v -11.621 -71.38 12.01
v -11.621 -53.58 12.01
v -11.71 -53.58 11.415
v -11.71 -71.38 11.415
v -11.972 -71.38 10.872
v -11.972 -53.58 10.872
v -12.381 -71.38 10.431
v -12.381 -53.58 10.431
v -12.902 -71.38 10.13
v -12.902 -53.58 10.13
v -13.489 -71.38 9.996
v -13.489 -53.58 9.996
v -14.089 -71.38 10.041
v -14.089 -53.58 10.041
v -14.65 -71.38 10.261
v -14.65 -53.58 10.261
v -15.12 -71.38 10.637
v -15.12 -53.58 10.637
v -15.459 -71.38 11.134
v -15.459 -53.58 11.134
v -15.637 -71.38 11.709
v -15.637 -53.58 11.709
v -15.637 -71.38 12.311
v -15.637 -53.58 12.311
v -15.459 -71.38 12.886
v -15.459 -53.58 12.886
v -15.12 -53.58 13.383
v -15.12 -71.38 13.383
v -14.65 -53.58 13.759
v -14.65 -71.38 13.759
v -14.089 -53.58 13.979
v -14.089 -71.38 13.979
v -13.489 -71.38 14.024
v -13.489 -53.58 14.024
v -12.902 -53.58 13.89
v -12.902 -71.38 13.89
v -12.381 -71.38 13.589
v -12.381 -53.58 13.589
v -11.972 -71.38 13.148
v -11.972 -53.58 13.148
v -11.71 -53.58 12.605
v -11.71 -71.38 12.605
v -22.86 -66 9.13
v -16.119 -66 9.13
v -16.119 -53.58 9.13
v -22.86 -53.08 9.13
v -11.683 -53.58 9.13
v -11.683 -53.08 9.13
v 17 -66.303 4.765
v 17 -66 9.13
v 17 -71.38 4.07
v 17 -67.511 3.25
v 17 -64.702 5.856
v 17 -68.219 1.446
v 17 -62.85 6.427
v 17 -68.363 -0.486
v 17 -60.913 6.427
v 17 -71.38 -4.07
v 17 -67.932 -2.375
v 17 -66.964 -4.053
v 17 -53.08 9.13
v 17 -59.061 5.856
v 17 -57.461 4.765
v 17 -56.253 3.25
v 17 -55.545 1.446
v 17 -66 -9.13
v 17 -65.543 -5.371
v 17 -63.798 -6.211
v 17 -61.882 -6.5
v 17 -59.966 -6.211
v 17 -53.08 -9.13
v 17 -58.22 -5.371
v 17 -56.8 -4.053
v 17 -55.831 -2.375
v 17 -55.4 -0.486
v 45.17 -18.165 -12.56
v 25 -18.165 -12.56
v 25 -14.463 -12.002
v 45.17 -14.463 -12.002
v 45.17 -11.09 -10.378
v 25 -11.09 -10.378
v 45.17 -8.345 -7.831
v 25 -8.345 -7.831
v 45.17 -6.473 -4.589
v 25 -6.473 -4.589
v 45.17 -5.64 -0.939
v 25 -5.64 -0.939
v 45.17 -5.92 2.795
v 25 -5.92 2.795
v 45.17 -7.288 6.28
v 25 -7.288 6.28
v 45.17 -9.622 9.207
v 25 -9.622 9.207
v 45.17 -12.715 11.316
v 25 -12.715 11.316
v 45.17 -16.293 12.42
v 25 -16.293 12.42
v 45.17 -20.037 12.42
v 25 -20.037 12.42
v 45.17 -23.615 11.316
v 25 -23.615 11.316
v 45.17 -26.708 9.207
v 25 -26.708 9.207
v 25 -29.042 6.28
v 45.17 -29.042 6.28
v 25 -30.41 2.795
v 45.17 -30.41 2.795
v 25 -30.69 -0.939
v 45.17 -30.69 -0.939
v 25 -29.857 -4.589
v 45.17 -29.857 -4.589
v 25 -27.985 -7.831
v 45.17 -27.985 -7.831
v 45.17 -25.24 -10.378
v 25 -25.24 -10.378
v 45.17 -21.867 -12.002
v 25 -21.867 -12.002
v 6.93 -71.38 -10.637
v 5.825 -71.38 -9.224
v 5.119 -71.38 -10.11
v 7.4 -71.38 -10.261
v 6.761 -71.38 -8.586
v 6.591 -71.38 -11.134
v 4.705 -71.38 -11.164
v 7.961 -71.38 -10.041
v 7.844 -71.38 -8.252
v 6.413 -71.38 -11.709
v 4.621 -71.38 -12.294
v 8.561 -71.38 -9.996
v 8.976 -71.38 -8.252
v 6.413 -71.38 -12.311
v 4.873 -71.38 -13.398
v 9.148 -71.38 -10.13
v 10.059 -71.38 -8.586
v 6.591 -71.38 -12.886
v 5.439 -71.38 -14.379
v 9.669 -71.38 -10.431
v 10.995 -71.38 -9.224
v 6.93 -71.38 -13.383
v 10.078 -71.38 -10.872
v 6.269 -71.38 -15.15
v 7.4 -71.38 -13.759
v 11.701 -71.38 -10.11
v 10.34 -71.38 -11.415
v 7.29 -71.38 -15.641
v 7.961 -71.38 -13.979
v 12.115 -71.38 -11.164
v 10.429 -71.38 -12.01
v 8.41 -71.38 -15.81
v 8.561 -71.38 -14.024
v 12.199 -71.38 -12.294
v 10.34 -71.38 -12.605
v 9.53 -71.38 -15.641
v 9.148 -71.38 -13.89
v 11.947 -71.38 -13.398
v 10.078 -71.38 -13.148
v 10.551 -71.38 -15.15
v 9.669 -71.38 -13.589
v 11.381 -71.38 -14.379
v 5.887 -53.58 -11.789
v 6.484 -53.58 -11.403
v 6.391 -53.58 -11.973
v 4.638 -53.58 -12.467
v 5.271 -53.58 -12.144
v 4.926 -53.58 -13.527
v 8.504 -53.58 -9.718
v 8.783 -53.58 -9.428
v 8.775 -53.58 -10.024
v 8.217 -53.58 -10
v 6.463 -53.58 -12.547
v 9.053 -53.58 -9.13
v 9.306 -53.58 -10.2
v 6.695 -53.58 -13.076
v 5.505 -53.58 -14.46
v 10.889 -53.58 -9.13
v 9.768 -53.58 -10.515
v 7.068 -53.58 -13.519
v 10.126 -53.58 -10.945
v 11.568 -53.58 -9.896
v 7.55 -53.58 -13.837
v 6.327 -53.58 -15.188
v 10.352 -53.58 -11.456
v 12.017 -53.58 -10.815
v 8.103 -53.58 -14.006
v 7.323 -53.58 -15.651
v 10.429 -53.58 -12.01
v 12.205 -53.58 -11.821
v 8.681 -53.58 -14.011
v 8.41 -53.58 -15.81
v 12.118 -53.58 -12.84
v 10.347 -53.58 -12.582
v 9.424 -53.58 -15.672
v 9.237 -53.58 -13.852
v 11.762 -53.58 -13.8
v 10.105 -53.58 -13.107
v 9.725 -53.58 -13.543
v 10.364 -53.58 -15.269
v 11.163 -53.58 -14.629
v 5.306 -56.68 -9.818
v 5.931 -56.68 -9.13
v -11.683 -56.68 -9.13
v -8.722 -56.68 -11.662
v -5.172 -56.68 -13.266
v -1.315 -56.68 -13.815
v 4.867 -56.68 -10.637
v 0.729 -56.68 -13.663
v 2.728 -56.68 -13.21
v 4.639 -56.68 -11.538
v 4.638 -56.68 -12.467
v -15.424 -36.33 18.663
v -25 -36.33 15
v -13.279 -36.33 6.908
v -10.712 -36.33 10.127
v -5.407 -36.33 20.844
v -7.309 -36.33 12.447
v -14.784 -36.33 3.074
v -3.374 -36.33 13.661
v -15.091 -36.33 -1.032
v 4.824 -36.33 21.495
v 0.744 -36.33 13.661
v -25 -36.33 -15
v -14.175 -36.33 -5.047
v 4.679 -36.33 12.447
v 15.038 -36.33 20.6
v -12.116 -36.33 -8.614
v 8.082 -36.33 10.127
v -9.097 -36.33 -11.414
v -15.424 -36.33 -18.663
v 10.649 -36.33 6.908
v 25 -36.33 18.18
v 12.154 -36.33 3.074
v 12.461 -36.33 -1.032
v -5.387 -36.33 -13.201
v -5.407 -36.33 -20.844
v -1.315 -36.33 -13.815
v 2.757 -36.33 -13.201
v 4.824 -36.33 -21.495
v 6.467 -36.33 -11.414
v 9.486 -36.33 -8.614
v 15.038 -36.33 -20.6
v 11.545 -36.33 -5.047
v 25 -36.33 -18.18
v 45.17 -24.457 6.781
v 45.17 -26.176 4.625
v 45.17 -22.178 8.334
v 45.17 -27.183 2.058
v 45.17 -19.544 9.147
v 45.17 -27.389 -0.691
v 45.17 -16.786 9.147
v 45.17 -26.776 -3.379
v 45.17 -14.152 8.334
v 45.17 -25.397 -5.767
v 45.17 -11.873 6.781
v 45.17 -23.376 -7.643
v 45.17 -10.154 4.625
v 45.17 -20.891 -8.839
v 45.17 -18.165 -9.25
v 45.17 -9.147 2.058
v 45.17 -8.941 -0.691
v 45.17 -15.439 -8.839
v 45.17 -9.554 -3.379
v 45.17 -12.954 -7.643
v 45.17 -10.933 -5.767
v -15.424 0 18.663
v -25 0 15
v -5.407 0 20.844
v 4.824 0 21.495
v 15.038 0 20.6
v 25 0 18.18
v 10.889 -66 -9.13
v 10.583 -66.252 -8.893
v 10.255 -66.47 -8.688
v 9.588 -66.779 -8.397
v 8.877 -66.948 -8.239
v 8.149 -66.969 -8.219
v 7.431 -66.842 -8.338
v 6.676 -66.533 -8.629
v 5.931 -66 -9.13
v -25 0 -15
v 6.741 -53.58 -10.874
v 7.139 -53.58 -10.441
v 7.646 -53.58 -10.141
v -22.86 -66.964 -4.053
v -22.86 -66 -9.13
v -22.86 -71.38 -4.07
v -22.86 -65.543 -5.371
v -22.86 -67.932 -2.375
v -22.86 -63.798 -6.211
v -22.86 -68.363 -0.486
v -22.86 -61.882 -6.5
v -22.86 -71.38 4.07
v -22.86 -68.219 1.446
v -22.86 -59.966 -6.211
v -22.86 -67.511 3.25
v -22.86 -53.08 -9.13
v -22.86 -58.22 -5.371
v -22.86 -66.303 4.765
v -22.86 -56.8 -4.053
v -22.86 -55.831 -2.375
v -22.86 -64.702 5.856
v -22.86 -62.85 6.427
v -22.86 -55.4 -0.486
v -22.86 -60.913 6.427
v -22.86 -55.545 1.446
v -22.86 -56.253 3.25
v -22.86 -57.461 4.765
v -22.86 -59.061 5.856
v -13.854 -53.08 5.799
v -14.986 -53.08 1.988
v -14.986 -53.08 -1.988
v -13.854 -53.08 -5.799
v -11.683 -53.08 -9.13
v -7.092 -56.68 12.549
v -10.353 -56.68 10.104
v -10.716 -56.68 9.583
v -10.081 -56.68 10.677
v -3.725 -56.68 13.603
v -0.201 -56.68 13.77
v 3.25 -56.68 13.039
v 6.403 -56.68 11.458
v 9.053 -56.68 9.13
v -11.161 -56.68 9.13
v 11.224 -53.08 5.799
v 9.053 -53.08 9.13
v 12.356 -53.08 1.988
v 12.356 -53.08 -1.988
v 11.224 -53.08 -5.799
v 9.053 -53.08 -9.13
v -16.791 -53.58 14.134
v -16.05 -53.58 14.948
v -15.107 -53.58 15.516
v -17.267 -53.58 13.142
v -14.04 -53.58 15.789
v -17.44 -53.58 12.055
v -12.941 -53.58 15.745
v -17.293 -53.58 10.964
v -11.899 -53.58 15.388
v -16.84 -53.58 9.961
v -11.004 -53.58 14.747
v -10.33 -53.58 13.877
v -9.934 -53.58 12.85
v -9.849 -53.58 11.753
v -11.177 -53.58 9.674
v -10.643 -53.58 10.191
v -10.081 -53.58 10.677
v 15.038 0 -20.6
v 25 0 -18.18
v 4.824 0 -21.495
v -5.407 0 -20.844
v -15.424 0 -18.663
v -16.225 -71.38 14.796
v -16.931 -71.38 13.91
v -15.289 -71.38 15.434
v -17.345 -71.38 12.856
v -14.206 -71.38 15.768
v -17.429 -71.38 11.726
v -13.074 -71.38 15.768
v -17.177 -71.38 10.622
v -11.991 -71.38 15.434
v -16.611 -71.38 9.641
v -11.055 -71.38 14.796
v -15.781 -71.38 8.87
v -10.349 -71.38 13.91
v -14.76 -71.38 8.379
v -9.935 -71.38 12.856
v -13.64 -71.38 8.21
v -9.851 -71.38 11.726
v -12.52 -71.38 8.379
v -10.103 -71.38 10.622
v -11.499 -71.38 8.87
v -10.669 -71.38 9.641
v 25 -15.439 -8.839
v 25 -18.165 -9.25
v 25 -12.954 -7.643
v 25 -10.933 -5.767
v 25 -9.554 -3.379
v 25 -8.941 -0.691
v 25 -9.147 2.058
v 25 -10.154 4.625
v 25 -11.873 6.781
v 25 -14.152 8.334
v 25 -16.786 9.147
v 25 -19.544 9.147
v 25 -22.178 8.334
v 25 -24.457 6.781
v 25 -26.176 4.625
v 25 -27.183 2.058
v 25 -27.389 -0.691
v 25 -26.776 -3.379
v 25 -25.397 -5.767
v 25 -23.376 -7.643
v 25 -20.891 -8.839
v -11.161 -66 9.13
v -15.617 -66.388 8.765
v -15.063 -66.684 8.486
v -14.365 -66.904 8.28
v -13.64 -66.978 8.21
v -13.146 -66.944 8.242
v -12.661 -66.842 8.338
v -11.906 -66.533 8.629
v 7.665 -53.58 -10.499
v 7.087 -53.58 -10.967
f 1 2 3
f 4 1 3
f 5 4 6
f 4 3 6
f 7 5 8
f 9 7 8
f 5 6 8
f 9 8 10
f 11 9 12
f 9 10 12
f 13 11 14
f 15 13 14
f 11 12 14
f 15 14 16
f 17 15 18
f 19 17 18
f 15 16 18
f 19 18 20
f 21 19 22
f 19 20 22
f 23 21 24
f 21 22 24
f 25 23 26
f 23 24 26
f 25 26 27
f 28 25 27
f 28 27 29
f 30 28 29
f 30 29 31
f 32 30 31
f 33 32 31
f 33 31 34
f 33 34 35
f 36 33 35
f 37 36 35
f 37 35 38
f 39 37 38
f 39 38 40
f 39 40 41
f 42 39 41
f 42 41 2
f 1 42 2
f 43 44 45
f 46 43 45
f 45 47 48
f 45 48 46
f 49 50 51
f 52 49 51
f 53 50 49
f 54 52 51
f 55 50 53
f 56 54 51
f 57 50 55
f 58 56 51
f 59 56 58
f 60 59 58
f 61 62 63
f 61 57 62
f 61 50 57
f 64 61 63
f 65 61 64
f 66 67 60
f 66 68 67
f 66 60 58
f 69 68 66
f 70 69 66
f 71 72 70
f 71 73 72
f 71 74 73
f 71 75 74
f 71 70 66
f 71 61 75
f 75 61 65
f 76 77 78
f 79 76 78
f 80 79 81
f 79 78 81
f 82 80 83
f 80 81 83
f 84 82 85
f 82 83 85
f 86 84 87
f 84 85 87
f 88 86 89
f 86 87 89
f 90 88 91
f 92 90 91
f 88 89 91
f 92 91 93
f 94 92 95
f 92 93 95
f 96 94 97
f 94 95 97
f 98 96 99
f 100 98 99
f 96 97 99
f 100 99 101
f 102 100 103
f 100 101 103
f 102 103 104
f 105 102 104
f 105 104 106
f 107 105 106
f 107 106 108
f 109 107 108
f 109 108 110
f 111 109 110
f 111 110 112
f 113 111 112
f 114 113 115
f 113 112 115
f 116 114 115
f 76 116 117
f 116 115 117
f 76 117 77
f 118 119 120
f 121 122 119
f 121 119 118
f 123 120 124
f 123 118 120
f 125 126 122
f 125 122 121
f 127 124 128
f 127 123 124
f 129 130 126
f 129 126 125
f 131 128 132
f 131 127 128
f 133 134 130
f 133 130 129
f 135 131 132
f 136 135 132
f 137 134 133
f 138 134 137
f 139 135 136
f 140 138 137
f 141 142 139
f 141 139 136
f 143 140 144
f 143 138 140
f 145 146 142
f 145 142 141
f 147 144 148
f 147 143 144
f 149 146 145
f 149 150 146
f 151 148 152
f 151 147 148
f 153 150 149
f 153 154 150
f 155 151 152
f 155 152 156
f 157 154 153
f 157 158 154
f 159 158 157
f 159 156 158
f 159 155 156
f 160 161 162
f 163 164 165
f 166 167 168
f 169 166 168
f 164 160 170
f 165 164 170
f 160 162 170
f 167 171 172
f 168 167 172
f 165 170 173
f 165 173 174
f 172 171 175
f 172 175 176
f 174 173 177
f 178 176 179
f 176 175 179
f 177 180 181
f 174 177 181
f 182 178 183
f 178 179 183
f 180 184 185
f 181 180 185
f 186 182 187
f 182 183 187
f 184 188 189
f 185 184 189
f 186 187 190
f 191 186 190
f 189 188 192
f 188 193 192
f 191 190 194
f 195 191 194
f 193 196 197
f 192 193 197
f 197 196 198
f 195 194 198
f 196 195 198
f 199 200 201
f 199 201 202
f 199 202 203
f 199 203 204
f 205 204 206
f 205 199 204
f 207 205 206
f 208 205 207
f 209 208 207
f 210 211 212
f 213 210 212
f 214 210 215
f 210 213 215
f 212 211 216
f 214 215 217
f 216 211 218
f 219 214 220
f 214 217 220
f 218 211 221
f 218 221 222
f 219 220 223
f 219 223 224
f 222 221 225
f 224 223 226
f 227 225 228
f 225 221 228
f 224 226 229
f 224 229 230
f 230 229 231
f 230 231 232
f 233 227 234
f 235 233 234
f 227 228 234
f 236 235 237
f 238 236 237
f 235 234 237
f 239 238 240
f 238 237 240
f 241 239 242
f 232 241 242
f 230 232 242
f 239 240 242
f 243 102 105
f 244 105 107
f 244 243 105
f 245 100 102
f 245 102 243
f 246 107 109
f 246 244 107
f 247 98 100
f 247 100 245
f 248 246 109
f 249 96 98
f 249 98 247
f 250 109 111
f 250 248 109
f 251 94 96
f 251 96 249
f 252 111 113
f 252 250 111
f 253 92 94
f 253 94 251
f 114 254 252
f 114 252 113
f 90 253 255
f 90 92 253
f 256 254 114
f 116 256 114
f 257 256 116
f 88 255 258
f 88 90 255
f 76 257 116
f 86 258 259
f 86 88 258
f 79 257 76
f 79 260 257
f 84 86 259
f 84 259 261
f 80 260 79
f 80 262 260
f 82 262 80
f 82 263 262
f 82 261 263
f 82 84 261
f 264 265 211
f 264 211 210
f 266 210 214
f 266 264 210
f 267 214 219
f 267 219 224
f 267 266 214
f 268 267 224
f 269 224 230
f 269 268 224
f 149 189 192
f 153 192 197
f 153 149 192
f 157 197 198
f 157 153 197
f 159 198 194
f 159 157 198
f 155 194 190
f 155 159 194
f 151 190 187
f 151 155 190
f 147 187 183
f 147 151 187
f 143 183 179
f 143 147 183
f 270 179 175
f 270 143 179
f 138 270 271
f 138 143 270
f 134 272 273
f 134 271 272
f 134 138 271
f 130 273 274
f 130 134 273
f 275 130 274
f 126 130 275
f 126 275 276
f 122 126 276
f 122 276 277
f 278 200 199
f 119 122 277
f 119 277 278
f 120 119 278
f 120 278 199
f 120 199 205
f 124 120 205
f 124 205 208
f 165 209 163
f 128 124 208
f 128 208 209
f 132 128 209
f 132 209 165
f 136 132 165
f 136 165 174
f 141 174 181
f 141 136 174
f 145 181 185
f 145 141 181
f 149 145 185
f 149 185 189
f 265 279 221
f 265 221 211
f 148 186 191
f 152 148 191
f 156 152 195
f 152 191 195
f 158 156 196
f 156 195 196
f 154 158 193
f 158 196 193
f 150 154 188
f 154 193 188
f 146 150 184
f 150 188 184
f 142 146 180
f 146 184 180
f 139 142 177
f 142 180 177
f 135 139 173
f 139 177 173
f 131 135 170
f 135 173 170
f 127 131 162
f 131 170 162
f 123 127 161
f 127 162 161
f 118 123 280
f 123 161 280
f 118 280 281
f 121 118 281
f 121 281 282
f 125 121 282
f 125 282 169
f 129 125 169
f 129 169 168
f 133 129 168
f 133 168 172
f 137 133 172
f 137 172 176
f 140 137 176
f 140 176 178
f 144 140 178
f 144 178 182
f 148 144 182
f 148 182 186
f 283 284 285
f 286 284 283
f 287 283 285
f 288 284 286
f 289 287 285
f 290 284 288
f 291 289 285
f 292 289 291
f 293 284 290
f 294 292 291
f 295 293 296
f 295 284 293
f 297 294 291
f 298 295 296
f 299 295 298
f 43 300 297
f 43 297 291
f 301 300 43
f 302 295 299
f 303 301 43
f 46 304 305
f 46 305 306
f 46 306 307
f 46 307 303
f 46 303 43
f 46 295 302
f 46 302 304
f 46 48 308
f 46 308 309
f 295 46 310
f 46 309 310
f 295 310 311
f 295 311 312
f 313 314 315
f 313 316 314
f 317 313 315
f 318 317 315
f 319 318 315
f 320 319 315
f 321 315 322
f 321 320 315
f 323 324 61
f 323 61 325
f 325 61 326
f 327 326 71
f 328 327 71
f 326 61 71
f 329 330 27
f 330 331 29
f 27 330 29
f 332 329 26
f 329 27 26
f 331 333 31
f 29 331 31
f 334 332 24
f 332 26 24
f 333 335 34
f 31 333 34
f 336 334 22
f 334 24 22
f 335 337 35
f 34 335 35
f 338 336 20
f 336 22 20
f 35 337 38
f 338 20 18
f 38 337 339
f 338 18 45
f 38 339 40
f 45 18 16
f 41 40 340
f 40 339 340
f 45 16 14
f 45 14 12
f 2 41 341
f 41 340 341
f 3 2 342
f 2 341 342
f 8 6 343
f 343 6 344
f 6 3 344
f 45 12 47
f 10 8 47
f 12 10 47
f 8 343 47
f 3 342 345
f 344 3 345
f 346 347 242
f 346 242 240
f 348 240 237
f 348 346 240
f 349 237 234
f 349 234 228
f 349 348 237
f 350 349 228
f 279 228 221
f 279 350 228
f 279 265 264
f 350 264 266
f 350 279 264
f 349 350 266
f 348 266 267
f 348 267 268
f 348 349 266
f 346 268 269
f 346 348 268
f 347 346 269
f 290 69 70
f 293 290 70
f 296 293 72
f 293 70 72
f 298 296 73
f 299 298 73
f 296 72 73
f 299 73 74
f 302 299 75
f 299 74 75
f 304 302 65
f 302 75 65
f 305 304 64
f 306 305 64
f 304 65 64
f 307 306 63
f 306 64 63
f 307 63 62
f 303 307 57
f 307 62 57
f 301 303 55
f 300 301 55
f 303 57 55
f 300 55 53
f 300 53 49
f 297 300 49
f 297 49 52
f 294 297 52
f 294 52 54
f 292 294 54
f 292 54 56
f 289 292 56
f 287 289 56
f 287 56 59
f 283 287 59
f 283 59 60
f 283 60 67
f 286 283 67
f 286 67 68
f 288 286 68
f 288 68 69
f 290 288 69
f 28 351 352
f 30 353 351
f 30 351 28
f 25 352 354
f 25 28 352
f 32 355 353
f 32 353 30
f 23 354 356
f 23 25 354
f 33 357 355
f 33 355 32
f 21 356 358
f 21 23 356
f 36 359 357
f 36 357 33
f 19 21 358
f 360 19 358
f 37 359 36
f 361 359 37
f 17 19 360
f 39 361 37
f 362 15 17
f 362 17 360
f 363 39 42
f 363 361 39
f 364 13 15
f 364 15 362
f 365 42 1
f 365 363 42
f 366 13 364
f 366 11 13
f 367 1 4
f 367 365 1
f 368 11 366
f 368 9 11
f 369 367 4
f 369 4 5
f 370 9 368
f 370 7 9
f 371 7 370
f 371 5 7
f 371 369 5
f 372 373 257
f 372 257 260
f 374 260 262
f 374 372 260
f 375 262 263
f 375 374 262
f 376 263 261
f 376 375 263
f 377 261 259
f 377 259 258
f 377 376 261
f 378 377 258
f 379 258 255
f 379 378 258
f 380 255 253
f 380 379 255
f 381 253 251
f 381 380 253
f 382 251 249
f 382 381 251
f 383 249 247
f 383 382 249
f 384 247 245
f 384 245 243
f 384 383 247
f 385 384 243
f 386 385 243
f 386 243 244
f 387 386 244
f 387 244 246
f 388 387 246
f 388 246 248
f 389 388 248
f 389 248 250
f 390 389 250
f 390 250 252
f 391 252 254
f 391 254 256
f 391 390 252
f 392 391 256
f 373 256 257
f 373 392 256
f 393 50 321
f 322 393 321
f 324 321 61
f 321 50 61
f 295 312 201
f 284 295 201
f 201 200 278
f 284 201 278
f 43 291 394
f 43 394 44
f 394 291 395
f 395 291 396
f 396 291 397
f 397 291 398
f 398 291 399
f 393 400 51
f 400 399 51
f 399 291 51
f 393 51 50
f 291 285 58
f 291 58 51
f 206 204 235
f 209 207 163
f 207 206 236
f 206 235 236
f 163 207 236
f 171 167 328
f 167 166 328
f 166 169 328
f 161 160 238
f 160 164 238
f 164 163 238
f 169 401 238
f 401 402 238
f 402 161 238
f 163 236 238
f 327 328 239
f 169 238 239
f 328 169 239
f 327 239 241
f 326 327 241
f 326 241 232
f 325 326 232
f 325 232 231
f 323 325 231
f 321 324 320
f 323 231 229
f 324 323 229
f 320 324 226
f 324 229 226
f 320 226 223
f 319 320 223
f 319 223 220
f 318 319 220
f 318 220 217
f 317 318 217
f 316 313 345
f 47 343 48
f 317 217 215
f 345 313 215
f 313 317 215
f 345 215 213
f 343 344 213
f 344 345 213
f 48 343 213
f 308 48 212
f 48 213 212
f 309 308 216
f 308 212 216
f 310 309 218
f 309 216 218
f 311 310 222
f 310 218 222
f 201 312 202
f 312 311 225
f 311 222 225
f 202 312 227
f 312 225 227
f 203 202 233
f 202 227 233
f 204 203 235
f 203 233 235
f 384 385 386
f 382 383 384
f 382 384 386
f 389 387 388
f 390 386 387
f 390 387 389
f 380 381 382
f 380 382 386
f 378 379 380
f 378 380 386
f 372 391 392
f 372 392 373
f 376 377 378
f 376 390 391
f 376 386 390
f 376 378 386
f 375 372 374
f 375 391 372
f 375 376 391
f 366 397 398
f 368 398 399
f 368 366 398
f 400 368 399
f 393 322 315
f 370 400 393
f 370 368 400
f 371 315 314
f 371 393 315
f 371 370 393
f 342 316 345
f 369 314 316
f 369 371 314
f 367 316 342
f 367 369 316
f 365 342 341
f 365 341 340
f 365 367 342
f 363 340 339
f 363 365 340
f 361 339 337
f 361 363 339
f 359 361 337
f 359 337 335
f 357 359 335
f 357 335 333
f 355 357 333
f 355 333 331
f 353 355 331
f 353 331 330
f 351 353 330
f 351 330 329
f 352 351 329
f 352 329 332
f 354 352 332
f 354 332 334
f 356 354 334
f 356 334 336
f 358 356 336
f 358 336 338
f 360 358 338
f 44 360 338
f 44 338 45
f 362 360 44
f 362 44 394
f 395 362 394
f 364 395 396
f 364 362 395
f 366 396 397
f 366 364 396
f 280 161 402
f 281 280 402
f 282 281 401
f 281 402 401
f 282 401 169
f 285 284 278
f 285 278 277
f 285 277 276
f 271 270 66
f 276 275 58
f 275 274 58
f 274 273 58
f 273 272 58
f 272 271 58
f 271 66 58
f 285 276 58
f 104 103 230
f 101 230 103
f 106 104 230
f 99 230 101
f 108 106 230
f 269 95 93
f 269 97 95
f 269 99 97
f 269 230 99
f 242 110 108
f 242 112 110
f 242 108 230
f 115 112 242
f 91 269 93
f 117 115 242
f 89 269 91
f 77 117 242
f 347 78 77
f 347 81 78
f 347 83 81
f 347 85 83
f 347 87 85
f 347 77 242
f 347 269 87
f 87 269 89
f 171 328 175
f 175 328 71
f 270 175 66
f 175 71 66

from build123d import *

# Parameters (mm, degrees)
BOSS_EXTRUDE1_DEPTH        = 36.33
SKETCH2_R                  = 12.56
SKETCH2_R_2                = 9.25
BOSS_EXTRUDE2_DEPTH        = 20.17
SKETCH3_R                  = 13.815
BOSS_EXTRUDE3_DEPTH        = 20.35
BOSS_EXTRUDE4_DEPTH        = 47.86
CUT_EXTRUDE1_DEPTH         = 8.000000034
SKETCH6_R                  = 6.5
CUT_EXTRUDE2_DEPTH         = 86.564913353
SKETCH7_R                  = 3.8
BOSS_EXTRUDE5_DEPTH        = 17.8
F_10_32_TAPPED_HOLE1_D     = 4.0386
F_10_32_TAPPED_HOLE1_DEPTH = 17.8


with BuildPart() as part:
    # Sketch1 → Boss-Extrude1 (new body)
    with BuildSketch(Plane(origin=(0, 0, 0), x_dir=(1, 0, 0), z_dir=(0, 1, 0))):
        with BuildLine():
            Line((-25, 15), (-25, -15))
            ThreePointArc((-25, -15), (-0.303555948, -21.362892261), (25, -18.18))
            Line((25, -18.18), (25, 18.18))
            ThreePointArc((25, 18.18), (-0.303555948, 21.362892261), (-25, 15))
        make_face()
    extrude(amount=-BOSS_EXTRUDE1_DEPTH)

    # Sketch2 → Boss-Extrude2 (add)
    with BuildSketch(Plane(origin=(25, 0, 0), x_dir=(0, 0, -1), z_dir=(1, 0, 0))):
        with Locations((0, -18.165)):
            Circle(SKETCH2_R)
        with Locations((0, -18.165)):
            Circle(SKETCH2_R_2, mode=Mode.SUBTRACT)
    extrude(amount=BOSS_EXTRUDE2_DEPTH)

    # Sketch3 → Boss-Extrude3 (add)
    with BuildSketch(Plane.XZ.offset(36.33)):
        with Locations(Location((-1.315, 0, 0), (0, 0, 270))):
            Circle(SKETCH3_R)
    extrude(amount=BOSS_EXTRUDE3_DEPTH)

    # Sketch4 → Boss-Extrude4 (add)
    with BuildSketch(Plane(origin=(25, 0, 0), x_dir=(0, 0, -1), z_dir=(1, 0, 0))):
        Polygon((-9.13, -66), (-9.13, -53.08), (9.13, -53.08), (9.13, -66), (4.07, -71.38), (-4.07, -71.38), align=None)
    extrude(amount=-BOSS_EXTRUDE4_DEPTH)

    # Sketch5 → Cut-Extrude1 (cut)
    with BuildSketch(Plane(origin=(25, 0, 0), x_dir=(0, 0, -1), z_dir=(1, 0, 0))):
        Polygon((-9.13, -66), (-4.07, -71.38), (4.07, -71.38), (9.13, -66), (9.13, -53.08), (-9.13, -53.08), align=None)
    extrude(amount=-CUT_EXTRUDE1_DEPTH, mode=Mode.SUBTRACT)

    # Sketch6 → Cut-Extrude2 (cut, through all)
    with BuildSketch(Plane(origin=(16.999999966, 0, 0), x_dir=(0, 0, -1), z_dir=(1, 0, 0))):
        with Locations((0, -61.881671093)):
            Circle(SKETCH6_R)
    extrude(amount=-CUT_EXTRUDE2_DEPTH, mode=Mode.SUBTRACT)

    # Sketch7 → Boss-Extrude5 (add)
    with BuildSketch(Plane.XZ.offset(71.38)):
        with Locations(Location((-13.64, 12.01, 0), (0, 0, 270))):
            Circle(SKETCH7_R)
        with Locations(Location((8.41, -12.01, 0), (0, 0, 270))):
            Circle(SKETCH7_R)
    extrude(amount=-BOSS_EXTRUDE5_DEPTH)

    # #10-32 Tapped Hole1
    with Locations(Plane(origin=(0, -71.38, 0), x_dir=(-1, 0, 0), z_dir=(0, -1, 0))):
        with Locations((13.64, -12.01), (-8.41, 12.01)):
            Hole(F_10_32_TAPPED_HOLE1_D / 2, depth=F_10_32_TAPPED_HOLE1_DEPTH)


solid = part.part
